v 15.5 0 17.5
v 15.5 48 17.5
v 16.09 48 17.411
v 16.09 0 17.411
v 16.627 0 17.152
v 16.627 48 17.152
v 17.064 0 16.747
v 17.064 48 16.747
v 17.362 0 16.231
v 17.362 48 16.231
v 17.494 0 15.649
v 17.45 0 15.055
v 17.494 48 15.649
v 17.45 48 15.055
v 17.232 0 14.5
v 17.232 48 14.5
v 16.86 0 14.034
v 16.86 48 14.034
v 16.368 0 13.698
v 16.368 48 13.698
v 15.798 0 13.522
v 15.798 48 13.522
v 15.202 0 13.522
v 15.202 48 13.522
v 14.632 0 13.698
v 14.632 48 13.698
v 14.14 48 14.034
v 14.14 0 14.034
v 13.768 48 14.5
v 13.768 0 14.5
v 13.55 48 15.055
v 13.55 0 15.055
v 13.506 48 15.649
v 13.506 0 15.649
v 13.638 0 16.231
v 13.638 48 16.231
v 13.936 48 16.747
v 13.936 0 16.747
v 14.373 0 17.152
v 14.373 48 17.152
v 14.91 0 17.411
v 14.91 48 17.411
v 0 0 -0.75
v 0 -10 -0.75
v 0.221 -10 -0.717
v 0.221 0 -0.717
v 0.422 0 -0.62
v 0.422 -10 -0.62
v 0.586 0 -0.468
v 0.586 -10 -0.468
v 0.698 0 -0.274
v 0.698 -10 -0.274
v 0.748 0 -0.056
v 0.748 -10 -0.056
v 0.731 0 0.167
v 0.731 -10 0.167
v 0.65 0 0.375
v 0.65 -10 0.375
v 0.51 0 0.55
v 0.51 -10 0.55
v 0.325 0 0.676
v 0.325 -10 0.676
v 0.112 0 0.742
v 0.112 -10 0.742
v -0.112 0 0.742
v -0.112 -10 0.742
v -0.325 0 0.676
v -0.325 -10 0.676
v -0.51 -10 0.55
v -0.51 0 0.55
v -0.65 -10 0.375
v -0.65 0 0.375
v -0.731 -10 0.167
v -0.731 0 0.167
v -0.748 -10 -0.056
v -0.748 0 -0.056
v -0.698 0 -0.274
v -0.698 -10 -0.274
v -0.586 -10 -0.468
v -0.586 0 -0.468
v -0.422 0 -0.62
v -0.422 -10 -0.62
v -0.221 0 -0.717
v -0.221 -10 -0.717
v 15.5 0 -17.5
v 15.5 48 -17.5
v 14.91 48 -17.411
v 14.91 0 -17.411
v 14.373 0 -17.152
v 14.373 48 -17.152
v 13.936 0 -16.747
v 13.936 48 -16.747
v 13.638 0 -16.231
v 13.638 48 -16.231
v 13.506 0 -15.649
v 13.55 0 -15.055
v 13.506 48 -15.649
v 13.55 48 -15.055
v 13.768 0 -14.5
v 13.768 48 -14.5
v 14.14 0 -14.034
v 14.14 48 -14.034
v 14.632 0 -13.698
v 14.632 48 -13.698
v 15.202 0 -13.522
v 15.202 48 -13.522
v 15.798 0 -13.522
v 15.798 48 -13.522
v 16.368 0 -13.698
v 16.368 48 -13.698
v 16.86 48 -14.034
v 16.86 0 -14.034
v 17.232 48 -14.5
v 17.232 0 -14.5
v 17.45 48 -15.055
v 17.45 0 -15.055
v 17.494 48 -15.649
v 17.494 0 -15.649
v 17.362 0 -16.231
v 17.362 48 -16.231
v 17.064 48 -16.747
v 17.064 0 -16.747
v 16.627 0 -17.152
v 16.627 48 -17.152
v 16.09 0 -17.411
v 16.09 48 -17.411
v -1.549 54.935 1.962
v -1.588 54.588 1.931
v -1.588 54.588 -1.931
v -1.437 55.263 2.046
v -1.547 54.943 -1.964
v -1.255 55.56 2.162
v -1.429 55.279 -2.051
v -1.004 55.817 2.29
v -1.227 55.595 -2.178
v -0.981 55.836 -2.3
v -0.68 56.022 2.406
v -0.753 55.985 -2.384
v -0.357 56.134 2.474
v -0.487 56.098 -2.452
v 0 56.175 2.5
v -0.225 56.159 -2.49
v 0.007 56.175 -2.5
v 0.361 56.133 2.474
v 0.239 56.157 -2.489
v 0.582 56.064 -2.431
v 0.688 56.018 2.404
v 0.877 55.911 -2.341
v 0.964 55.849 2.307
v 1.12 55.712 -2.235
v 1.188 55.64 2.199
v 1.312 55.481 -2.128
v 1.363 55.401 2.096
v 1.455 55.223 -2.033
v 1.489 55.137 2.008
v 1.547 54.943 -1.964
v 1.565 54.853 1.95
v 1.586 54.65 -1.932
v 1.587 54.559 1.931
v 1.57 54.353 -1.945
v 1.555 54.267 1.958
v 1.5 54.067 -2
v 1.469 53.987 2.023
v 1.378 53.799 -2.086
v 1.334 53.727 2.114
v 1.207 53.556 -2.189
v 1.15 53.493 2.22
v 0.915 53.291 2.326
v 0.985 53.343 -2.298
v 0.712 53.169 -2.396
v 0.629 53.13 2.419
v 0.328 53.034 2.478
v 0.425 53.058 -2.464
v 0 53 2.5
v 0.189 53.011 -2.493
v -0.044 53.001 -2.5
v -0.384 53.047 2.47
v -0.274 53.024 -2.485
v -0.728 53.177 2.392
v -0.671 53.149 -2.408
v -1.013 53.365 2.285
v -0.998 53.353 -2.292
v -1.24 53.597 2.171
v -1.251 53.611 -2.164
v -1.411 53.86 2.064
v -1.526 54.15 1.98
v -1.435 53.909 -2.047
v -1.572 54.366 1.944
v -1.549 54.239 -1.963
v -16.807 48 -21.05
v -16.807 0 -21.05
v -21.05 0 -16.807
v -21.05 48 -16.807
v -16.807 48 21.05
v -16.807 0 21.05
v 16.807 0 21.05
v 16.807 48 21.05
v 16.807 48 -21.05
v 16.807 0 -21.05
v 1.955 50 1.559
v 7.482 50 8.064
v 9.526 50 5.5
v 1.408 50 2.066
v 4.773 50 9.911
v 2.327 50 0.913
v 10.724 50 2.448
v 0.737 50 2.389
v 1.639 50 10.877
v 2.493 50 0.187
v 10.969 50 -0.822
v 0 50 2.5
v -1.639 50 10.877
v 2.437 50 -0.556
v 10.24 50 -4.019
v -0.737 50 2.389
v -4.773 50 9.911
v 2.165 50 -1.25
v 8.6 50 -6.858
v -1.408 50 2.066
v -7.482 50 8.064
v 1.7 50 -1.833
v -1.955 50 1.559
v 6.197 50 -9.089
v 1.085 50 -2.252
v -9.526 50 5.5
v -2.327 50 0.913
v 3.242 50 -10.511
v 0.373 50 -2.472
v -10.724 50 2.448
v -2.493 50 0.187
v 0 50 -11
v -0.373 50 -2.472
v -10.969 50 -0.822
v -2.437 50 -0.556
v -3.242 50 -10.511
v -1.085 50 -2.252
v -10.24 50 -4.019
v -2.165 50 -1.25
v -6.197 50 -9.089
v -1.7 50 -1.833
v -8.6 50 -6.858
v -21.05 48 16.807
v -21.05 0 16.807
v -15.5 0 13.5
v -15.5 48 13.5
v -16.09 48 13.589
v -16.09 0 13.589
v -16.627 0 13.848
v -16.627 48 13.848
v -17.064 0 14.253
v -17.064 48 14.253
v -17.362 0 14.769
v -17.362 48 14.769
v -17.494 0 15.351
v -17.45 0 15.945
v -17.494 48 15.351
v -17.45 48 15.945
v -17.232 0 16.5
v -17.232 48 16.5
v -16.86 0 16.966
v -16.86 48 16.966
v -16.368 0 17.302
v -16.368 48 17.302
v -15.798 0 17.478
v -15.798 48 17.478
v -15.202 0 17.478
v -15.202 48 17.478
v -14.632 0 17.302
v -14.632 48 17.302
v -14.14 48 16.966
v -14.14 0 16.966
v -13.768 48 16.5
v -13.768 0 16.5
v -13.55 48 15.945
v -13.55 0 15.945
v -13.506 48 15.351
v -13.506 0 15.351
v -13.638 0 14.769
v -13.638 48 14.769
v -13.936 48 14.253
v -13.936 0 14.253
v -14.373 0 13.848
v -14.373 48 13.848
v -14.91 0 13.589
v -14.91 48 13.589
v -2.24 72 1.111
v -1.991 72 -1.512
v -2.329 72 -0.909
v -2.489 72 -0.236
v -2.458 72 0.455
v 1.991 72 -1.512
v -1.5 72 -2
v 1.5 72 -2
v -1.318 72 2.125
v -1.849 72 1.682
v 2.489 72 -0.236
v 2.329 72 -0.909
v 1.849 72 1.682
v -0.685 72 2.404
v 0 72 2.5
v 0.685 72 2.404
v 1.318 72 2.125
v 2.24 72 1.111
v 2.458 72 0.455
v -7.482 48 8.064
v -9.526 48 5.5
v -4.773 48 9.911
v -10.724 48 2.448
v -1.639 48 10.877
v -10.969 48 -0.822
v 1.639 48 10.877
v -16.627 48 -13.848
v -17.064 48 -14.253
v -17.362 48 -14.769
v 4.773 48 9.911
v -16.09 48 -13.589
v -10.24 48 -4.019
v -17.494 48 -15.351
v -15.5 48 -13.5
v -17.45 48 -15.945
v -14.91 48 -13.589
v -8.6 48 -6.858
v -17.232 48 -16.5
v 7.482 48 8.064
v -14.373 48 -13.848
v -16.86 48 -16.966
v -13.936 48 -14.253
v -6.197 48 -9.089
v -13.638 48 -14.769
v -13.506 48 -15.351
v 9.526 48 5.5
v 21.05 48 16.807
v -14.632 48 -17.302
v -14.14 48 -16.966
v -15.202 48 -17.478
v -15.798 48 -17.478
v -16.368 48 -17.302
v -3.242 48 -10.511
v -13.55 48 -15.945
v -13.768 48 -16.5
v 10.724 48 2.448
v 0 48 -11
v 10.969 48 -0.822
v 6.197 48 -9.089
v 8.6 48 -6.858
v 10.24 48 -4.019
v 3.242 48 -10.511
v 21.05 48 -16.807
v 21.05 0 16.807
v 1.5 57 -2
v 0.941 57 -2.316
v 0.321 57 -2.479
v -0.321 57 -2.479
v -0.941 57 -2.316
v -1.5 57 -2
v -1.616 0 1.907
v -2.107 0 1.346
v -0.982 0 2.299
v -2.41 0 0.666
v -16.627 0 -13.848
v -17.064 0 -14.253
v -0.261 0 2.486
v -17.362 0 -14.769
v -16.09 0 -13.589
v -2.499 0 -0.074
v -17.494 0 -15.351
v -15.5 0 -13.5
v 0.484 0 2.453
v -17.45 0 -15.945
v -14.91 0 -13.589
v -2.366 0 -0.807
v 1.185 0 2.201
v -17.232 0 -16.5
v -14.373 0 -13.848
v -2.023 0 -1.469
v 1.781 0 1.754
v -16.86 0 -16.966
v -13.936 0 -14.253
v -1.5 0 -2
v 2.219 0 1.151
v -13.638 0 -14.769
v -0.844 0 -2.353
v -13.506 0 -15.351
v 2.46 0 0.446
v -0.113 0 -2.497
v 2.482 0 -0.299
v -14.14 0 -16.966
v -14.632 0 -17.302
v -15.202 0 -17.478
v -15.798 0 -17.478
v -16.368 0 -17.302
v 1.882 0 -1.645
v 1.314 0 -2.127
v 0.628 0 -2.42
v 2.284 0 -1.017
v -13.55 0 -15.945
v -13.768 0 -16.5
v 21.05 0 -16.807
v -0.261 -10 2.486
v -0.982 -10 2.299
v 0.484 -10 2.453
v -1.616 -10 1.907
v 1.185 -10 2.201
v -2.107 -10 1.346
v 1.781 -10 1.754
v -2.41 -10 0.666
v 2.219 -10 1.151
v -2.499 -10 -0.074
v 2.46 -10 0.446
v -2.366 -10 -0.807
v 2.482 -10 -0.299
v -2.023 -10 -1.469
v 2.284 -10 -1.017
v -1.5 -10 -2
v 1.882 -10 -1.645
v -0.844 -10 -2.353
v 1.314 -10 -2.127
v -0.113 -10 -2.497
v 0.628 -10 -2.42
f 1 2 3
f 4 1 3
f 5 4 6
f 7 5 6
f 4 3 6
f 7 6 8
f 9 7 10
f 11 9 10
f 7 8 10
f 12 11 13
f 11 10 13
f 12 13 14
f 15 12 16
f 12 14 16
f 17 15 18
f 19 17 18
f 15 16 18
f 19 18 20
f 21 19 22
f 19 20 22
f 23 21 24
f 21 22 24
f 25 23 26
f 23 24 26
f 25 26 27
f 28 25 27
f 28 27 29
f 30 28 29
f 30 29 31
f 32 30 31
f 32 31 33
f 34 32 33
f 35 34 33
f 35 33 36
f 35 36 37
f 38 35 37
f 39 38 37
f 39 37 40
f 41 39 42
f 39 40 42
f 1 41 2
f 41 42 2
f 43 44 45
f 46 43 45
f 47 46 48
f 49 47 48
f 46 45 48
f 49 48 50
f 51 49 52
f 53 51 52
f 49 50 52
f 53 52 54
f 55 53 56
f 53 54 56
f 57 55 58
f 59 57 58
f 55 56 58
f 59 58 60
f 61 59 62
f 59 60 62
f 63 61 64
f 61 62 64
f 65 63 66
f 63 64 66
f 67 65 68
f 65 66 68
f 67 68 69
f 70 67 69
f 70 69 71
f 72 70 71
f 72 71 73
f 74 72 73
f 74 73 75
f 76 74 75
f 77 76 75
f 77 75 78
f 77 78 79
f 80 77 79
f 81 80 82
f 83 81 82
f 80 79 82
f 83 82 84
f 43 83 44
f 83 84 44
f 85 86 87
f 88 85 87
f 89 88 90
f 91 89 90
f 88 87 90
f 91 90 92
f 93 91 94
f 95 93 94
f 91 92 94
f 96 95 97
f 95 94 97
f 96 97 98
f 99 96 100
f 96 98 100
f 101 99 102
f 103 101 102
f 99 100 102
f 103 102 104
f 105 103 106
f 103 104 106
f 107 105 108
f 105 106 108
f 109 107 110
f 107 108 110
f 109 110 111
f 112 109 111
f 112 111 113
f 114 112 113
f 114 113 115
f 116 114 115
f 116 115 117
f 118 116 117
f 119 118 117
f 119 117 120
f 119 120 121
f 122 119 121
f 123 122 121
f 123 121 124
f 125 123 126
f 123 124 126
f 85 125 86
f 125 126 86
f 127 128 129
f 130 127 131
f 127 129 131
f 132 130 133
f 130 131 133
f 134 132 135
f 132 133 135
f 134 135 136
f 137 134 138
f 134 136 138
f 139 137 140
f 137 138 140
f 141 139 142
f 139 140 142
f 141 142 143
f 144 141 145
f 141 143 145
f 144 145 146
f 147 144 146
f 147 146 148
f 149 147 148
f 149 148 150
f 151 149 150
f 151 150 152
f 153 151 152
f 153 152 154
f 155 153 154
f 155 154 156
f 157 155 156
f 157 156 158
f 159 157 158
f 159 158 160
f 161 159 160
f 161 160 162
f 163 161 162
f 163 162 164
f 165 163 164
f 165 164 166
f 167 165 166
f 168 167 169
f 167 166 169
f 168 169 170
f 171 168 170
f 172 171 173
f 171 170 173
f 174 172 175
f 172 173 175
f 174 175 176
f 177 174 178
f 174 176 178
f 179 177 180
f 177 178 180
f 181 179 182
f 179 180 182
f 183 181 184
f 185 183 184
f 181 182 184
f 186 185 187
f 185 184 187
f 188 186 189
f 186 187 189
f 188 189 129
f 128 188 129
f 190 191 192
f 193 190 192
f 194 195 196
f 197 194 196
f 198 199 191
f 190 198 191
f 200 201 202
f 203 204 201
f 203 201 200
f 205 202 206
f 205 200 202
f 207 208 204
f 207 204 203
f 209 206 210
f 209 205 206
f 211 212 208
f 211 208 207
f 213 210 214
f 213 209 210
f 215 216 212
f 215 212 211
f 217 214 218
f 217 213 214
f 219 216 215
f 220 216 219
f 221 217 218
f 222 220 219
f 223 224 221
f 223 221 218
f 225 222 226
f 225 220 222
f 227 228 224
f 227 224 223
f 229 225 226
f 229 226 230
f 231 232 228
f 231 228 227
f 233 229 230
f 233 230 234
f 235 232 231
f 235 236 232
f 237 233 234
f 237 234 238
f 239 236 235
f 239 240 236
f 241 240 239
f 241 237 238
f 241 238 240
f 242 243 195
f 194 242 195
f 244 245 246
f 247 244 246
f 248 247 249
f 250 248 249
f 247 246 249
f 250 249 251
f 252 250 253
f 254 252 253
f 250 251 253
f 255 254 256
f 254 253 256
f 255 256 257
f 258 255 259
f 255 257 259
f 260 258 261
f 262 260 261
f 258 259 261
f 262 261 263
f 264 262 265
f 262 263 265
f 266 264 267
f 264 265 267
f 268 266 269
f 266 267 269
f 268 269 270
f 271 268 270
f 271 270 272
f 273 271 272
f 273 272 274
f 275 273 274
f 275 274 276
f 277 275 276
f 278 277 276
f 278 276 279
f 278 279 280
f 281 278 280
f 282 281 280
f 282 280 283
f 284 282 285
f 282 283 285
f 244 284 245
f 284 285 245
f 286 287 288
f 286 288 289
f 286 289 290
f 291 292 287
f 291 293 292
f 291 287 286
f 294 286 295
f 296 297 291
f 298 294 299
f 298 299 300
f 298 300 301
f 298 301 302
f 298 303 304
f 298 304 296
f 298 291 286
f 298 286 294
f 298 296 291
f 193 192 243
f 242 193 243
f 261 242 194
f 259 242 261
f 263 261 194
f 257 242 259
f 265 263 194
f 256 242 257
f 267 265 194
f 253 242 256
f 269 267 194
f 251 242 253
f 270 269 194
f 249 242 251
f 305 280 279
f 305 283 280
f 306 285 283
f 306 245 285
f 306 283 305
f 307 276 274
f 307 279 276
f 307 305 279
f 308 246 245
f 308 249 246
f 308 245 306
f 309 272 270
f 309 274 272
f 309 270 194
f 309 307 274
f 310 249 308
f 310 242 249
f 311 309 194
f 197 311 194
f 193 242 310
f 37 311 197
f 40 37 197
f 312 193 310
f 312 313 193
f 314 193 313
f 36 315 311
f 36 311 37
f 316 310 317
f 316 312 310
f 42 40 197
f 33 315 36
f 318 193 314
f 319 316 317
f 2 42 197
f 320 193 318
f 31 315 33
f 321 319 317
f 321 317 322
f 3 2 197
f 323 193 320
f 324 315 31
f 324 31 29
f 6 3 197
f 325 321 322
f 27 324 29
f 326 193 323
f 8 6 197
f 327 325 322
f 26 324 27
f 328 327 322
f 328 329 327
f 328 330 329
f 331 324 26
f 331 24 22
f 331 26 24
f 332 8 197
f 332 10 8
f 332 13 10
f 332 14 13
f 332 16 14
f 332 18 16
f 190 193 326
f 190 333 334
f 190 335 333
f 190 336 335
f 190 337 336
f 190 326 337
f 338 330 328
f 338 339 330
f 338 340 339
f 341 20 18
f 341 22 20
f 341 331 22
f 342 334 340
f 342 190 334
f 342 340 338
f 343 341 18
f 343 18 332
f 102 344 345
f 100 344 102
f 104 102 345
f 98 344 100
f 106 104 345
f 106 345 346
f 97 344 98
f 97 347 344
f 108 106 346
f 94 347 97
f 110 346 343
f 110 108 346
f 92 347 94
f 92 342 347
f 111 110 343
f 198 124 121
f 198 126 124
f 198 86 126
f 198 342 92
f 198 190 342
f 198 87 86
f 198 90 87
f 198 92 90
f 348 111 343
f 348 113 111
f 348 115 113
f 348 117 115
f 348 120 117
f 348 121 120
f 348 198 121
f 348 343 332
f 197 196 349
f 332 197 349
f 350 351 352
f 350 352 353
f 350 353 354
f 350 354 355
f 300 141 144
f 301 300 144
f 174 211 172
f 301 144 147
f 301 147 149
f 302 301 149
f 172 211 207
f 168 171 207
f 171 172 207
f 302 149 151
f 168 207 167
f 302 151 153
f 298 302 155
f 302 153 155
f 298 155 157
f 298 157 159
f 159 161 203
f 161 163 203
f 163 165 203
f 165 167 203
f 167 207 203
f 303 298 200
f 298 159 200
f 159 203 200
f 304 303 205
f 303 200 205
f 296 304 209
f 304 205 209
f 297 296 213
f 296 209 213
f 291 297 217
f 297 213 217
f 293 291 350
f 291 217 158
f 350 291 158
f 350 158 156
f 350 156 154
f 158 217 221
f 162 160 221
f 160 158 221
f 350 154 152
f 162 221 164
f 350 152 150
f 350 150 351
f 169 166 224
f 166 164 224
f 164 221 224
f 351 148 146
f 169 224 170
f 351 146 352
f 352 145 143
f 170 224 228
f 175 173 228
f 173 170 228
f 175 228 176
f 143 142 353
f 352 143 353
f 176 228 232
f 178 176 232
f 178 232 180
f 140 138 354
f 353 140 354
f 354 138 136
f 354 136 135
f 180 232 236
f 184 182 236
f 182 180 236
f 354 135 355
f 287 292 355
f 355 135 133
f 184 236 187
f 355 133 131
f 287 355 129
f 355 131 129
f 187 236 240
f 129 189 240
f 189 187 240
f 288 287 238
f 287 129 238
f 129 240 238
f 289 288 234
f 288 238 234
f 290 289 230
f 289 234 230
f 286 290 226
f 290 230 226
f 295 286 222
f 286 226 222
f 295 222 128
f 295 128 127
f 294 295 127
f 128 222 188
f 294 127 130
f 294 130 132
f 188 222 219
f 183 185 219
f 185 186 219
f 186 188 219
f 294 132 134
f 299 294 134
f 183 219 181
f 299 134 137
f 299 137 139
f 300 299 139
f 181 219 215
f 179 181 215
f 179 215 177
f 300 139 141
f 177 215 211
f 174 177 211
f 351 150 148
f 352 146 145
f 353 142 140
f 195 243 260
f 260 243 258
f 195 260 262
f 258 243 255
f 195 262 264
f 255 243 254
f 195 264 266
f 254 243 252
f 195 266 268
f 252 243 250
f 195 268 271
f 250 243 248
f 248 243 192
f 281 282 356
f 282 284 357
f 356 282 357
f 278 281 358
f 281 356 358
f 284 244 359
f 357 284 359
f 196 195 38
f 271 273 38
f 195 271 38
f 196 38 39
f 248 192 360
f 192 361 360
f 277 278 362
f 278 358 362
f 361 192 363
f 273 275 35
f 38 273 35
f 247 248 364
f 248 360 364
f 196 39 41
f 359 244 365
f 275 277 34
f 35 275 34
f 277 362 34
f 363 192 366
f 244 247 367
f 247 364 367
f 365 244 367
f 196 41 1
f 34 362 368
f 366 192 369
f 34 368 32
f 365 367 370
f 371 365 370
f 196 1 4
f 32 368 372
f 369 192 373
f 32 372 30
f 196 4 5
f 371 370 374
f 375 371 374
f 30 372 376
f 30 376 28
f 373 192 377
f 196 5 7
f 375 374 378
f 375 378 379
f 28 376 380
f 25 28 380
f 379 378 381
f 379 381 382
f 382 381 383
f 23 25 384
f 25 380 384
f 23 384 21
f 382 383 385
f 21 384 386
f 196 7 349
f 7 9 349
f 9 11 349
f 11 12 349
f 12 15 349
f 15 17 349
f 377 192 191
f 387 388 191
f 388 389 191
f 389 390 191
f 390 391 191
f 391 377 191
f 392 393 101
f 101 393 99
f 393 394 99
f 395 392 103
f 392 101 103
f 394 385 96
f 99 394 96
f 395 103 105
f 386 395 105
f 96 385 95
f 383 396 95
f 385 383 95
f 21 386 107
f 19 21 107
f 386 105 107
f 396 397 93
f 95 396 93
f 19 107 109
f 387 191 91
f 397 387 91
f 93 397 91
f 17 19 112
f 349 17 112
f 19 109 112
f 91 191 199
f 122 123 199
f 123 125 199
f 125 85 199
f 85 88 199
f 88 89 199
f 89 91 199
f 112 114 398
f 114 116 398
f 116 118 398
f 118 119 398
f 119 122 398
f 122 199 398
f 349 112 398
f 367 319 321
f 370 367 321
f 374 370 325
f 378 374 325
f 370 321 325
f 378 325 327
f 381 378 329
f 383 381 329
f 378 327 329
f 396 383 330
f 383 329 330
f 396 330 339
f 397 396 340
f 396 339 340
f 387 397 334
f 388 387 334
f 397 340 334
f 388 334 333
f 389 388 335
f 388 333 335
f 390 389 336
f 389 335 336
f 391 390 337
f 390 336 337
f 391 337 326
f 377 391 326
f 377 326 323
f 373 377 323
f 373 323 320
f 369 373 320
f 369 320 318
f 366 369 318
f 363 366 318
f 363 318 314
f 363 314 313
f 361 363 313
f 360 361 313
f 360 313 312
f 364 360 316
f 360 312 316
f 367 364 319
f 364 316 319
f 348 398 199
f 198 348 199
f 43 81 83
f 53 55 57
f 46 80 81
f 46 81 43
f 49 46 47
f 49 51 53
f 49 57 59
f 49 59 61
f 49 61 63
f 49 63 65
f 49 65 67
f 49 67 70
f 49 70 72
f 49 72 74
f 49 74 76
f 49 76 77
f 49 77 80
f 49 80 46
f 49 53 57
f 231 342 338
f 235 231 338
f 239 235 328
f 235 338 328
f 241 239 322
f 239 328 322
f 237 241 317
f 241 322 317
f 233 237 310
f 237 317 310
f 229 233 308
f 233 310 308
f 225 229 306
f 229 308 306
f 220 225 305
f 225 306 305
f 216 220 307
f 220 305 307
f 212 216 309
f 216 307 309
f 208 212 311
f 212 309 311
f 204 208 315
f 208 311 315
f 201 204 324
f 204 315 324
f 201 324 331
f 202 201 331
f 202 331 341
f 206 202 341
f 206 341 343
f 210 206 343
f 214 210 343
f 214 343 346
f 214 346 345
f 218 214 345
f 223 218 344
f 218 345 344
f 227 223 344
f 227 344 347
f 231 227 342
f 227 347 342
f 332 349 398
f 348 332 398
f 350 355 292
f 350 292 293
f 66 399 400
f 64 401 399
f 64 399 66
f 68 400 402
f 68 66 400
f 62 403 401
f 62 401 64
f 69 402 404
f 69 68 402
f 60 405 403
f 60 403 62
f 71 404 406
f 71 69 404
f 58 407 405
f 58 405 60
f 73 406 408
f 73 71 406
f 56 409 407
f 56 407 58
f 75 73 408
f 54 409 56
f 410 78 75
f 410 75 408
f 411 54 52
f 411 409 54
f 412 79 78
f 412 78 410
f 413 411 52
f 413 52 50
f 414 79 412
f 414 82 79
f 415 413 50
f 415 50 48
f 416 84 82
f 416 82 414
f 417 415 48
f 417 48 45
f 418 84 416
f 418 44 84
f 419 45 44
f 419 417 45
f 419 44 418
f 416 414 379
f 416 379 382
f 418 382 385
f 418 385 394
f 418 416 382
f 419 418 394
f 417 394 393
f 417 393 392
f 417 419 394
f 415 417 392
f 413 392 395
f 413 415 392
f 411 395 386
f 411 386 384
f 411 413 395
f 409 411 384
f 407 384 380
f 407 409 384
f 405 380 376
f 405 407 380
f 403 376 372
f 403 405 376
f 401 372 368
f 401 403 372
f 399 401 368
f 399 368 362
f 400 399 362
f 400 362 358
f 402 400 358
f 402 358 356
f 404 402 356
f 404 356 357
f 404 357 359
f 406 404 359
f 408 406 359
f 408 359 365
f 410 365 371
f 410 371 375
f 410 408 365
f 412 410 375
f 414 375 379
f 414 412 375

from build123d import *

# Parameters (mm, degrees)
BOSS_EXTRUDE1_DEPTH = 48
SKETCH2_R           = 2
CUT_EXTRUDE1_DEPTH  = 48
SKETCH3_R           = 11
BOSS_EXTRUDE2_DEPTH = 2
SKETCH4_R           = 2.5
BOSS_EXTRUDE3_DEPTH = 22
CUT_EXTRUDE2_START  = -15
CUT_EXTRUDE2_DEPTH  = 15
SKETCH6_R           = 1.5875
CUT_EXTRUDE5_DEPTH  = 79.623819546
BOSS_EXTRUDE4_START = 10
SKETCH7_R           = 2.5
BOSS_EXTRUDE4_DEPTH = 10
SKETCH8_R           = 0.75
CUT_EXTRUDE6_DEPTH  = 10


with BuildPart() as part:
    # Sketch1 → Boss-Extrude1 (new body)
    with BuildSketch(Plane(origin=(0, 0, 0), x_dir=(1, 0, 0), z_dir=(0, 1, 0))):
        Polygon((16.807359313, -21.05), (21.05, -16.807359313), (21.05, 16.807359313), (16.807359313, 21.05), (-16.807359313, 21.05), (-21.05, 16.807359313), (-21.05, -16.807359313), (-16.807359313, -21.05), align=None)
    extrude(amount=BOSS_EXTRUDE1_DEPTH)

    # Sketch2 → Cut-Extrude1 (cut)
    with BuildSketch(Plane(origin=(0, 48, 0), x_dir=(1, 0, 0), z_dir=(0, 1, 0))):
        with Locations(Location((-15.5, 15.5, 0), (0, 0, 270))):
            Circle(SKETCH2_R)
        with Locations(Location((15.5, 15.5, 0), (0, 0, 90))):
            Circle(SKETCH2_R)
        with Locations(Location((15.5, -15.5, 0), (0, 0, 270))):
            Circle(SKETCH2_R)
        with Locations(Location((-15.5, -15.5, 0), (0, 0, 90))):
            Circle(SKETCH2_R)
    extrude(amount=-CUT_EXTRUDE1_DEPTH, mode=Mode.SUBTRACT)

    # Sketch3 → Boss-Extrude2 (add)
    with BuildSketch(Plane(origin=(0, 48, 0), x_dir=(1, 0, 0), z_dir=(0, 1, 0))):
        with Locations(Location((0, 0, 0), (0, 0, 90))):
            Circle(SKETCH3_R)
    extrude(amount=BOSS_EXTRUDE2_DEPTH)

    # Sketch4 → Boss-Extrude3 (add)
    with BuildSketch(Plane(origin=(0, 50, 0), x_dir=(1, 0, 0), z_dir=(0, 1, 0))):
        with Locations(Location((0, 0, 0), (0, 0, 270))):
            Circle(SKETCH4_R)
    extrude(amount=BOSS_EXTRUDE3_DEPTH)

    # Sketch5 → Cut-Extrude2 (cut)
    with BuildSketch(Plane(origin=(0, 72, 0), x_dir=(1, 0, 0), z_dir=(0, 1, 0)).offset(CUT_EXTRUDE2_START)):
        with BuildLine():
            Line((-1.5, 2), (1.5, 2))
            ThreePointArc((1.5, 2), (0, 2.5), (-1.5, 2))
        make_face()
    extrude(amount=CUT_EXTRUDE2_DEPTH, mode=Mode.SUBTRACT)

    # Sketch6 → Cut-Extrude5 (cut, through all)
    with BuildSketch(Plane(origin=(0, 0, -2.5), x_dir=(-1, 0, 0), z_dir=(0, 0, -1))):
        with Locations((0, 54.5875)):
            Circle(SKETCH6_R)
    extrude(amount=-CUT_EXTRUDE5_DEPTH, mode=Mode.SUBTRACT)

    # Sketch7 → Boss-Extrude4 (add)
    with BuildSketch(Plane.XZ.offset(BOSS_EXTRUDE4_START)):
        with Locations(Location((0, 0, 0), (0, 0, 233.130102354))):
            Circle(SKETCH7_R)
    extrude(amount=-BOSS_EXTRUDE4_DEPTH)

    # Sketch8 → Cut-Extrude6 (cut)
    with BuildSketch(Plane.XZ.offset(10)):
        with Locations(Location((0, 0, 0), (0, 0, 270))):
            Circle(SKETCH8_R)
    extrude(amount=-CUT_EXTRUDE6_DEPTH, mode=Mode.SUBTRACT)


solid = part.part
